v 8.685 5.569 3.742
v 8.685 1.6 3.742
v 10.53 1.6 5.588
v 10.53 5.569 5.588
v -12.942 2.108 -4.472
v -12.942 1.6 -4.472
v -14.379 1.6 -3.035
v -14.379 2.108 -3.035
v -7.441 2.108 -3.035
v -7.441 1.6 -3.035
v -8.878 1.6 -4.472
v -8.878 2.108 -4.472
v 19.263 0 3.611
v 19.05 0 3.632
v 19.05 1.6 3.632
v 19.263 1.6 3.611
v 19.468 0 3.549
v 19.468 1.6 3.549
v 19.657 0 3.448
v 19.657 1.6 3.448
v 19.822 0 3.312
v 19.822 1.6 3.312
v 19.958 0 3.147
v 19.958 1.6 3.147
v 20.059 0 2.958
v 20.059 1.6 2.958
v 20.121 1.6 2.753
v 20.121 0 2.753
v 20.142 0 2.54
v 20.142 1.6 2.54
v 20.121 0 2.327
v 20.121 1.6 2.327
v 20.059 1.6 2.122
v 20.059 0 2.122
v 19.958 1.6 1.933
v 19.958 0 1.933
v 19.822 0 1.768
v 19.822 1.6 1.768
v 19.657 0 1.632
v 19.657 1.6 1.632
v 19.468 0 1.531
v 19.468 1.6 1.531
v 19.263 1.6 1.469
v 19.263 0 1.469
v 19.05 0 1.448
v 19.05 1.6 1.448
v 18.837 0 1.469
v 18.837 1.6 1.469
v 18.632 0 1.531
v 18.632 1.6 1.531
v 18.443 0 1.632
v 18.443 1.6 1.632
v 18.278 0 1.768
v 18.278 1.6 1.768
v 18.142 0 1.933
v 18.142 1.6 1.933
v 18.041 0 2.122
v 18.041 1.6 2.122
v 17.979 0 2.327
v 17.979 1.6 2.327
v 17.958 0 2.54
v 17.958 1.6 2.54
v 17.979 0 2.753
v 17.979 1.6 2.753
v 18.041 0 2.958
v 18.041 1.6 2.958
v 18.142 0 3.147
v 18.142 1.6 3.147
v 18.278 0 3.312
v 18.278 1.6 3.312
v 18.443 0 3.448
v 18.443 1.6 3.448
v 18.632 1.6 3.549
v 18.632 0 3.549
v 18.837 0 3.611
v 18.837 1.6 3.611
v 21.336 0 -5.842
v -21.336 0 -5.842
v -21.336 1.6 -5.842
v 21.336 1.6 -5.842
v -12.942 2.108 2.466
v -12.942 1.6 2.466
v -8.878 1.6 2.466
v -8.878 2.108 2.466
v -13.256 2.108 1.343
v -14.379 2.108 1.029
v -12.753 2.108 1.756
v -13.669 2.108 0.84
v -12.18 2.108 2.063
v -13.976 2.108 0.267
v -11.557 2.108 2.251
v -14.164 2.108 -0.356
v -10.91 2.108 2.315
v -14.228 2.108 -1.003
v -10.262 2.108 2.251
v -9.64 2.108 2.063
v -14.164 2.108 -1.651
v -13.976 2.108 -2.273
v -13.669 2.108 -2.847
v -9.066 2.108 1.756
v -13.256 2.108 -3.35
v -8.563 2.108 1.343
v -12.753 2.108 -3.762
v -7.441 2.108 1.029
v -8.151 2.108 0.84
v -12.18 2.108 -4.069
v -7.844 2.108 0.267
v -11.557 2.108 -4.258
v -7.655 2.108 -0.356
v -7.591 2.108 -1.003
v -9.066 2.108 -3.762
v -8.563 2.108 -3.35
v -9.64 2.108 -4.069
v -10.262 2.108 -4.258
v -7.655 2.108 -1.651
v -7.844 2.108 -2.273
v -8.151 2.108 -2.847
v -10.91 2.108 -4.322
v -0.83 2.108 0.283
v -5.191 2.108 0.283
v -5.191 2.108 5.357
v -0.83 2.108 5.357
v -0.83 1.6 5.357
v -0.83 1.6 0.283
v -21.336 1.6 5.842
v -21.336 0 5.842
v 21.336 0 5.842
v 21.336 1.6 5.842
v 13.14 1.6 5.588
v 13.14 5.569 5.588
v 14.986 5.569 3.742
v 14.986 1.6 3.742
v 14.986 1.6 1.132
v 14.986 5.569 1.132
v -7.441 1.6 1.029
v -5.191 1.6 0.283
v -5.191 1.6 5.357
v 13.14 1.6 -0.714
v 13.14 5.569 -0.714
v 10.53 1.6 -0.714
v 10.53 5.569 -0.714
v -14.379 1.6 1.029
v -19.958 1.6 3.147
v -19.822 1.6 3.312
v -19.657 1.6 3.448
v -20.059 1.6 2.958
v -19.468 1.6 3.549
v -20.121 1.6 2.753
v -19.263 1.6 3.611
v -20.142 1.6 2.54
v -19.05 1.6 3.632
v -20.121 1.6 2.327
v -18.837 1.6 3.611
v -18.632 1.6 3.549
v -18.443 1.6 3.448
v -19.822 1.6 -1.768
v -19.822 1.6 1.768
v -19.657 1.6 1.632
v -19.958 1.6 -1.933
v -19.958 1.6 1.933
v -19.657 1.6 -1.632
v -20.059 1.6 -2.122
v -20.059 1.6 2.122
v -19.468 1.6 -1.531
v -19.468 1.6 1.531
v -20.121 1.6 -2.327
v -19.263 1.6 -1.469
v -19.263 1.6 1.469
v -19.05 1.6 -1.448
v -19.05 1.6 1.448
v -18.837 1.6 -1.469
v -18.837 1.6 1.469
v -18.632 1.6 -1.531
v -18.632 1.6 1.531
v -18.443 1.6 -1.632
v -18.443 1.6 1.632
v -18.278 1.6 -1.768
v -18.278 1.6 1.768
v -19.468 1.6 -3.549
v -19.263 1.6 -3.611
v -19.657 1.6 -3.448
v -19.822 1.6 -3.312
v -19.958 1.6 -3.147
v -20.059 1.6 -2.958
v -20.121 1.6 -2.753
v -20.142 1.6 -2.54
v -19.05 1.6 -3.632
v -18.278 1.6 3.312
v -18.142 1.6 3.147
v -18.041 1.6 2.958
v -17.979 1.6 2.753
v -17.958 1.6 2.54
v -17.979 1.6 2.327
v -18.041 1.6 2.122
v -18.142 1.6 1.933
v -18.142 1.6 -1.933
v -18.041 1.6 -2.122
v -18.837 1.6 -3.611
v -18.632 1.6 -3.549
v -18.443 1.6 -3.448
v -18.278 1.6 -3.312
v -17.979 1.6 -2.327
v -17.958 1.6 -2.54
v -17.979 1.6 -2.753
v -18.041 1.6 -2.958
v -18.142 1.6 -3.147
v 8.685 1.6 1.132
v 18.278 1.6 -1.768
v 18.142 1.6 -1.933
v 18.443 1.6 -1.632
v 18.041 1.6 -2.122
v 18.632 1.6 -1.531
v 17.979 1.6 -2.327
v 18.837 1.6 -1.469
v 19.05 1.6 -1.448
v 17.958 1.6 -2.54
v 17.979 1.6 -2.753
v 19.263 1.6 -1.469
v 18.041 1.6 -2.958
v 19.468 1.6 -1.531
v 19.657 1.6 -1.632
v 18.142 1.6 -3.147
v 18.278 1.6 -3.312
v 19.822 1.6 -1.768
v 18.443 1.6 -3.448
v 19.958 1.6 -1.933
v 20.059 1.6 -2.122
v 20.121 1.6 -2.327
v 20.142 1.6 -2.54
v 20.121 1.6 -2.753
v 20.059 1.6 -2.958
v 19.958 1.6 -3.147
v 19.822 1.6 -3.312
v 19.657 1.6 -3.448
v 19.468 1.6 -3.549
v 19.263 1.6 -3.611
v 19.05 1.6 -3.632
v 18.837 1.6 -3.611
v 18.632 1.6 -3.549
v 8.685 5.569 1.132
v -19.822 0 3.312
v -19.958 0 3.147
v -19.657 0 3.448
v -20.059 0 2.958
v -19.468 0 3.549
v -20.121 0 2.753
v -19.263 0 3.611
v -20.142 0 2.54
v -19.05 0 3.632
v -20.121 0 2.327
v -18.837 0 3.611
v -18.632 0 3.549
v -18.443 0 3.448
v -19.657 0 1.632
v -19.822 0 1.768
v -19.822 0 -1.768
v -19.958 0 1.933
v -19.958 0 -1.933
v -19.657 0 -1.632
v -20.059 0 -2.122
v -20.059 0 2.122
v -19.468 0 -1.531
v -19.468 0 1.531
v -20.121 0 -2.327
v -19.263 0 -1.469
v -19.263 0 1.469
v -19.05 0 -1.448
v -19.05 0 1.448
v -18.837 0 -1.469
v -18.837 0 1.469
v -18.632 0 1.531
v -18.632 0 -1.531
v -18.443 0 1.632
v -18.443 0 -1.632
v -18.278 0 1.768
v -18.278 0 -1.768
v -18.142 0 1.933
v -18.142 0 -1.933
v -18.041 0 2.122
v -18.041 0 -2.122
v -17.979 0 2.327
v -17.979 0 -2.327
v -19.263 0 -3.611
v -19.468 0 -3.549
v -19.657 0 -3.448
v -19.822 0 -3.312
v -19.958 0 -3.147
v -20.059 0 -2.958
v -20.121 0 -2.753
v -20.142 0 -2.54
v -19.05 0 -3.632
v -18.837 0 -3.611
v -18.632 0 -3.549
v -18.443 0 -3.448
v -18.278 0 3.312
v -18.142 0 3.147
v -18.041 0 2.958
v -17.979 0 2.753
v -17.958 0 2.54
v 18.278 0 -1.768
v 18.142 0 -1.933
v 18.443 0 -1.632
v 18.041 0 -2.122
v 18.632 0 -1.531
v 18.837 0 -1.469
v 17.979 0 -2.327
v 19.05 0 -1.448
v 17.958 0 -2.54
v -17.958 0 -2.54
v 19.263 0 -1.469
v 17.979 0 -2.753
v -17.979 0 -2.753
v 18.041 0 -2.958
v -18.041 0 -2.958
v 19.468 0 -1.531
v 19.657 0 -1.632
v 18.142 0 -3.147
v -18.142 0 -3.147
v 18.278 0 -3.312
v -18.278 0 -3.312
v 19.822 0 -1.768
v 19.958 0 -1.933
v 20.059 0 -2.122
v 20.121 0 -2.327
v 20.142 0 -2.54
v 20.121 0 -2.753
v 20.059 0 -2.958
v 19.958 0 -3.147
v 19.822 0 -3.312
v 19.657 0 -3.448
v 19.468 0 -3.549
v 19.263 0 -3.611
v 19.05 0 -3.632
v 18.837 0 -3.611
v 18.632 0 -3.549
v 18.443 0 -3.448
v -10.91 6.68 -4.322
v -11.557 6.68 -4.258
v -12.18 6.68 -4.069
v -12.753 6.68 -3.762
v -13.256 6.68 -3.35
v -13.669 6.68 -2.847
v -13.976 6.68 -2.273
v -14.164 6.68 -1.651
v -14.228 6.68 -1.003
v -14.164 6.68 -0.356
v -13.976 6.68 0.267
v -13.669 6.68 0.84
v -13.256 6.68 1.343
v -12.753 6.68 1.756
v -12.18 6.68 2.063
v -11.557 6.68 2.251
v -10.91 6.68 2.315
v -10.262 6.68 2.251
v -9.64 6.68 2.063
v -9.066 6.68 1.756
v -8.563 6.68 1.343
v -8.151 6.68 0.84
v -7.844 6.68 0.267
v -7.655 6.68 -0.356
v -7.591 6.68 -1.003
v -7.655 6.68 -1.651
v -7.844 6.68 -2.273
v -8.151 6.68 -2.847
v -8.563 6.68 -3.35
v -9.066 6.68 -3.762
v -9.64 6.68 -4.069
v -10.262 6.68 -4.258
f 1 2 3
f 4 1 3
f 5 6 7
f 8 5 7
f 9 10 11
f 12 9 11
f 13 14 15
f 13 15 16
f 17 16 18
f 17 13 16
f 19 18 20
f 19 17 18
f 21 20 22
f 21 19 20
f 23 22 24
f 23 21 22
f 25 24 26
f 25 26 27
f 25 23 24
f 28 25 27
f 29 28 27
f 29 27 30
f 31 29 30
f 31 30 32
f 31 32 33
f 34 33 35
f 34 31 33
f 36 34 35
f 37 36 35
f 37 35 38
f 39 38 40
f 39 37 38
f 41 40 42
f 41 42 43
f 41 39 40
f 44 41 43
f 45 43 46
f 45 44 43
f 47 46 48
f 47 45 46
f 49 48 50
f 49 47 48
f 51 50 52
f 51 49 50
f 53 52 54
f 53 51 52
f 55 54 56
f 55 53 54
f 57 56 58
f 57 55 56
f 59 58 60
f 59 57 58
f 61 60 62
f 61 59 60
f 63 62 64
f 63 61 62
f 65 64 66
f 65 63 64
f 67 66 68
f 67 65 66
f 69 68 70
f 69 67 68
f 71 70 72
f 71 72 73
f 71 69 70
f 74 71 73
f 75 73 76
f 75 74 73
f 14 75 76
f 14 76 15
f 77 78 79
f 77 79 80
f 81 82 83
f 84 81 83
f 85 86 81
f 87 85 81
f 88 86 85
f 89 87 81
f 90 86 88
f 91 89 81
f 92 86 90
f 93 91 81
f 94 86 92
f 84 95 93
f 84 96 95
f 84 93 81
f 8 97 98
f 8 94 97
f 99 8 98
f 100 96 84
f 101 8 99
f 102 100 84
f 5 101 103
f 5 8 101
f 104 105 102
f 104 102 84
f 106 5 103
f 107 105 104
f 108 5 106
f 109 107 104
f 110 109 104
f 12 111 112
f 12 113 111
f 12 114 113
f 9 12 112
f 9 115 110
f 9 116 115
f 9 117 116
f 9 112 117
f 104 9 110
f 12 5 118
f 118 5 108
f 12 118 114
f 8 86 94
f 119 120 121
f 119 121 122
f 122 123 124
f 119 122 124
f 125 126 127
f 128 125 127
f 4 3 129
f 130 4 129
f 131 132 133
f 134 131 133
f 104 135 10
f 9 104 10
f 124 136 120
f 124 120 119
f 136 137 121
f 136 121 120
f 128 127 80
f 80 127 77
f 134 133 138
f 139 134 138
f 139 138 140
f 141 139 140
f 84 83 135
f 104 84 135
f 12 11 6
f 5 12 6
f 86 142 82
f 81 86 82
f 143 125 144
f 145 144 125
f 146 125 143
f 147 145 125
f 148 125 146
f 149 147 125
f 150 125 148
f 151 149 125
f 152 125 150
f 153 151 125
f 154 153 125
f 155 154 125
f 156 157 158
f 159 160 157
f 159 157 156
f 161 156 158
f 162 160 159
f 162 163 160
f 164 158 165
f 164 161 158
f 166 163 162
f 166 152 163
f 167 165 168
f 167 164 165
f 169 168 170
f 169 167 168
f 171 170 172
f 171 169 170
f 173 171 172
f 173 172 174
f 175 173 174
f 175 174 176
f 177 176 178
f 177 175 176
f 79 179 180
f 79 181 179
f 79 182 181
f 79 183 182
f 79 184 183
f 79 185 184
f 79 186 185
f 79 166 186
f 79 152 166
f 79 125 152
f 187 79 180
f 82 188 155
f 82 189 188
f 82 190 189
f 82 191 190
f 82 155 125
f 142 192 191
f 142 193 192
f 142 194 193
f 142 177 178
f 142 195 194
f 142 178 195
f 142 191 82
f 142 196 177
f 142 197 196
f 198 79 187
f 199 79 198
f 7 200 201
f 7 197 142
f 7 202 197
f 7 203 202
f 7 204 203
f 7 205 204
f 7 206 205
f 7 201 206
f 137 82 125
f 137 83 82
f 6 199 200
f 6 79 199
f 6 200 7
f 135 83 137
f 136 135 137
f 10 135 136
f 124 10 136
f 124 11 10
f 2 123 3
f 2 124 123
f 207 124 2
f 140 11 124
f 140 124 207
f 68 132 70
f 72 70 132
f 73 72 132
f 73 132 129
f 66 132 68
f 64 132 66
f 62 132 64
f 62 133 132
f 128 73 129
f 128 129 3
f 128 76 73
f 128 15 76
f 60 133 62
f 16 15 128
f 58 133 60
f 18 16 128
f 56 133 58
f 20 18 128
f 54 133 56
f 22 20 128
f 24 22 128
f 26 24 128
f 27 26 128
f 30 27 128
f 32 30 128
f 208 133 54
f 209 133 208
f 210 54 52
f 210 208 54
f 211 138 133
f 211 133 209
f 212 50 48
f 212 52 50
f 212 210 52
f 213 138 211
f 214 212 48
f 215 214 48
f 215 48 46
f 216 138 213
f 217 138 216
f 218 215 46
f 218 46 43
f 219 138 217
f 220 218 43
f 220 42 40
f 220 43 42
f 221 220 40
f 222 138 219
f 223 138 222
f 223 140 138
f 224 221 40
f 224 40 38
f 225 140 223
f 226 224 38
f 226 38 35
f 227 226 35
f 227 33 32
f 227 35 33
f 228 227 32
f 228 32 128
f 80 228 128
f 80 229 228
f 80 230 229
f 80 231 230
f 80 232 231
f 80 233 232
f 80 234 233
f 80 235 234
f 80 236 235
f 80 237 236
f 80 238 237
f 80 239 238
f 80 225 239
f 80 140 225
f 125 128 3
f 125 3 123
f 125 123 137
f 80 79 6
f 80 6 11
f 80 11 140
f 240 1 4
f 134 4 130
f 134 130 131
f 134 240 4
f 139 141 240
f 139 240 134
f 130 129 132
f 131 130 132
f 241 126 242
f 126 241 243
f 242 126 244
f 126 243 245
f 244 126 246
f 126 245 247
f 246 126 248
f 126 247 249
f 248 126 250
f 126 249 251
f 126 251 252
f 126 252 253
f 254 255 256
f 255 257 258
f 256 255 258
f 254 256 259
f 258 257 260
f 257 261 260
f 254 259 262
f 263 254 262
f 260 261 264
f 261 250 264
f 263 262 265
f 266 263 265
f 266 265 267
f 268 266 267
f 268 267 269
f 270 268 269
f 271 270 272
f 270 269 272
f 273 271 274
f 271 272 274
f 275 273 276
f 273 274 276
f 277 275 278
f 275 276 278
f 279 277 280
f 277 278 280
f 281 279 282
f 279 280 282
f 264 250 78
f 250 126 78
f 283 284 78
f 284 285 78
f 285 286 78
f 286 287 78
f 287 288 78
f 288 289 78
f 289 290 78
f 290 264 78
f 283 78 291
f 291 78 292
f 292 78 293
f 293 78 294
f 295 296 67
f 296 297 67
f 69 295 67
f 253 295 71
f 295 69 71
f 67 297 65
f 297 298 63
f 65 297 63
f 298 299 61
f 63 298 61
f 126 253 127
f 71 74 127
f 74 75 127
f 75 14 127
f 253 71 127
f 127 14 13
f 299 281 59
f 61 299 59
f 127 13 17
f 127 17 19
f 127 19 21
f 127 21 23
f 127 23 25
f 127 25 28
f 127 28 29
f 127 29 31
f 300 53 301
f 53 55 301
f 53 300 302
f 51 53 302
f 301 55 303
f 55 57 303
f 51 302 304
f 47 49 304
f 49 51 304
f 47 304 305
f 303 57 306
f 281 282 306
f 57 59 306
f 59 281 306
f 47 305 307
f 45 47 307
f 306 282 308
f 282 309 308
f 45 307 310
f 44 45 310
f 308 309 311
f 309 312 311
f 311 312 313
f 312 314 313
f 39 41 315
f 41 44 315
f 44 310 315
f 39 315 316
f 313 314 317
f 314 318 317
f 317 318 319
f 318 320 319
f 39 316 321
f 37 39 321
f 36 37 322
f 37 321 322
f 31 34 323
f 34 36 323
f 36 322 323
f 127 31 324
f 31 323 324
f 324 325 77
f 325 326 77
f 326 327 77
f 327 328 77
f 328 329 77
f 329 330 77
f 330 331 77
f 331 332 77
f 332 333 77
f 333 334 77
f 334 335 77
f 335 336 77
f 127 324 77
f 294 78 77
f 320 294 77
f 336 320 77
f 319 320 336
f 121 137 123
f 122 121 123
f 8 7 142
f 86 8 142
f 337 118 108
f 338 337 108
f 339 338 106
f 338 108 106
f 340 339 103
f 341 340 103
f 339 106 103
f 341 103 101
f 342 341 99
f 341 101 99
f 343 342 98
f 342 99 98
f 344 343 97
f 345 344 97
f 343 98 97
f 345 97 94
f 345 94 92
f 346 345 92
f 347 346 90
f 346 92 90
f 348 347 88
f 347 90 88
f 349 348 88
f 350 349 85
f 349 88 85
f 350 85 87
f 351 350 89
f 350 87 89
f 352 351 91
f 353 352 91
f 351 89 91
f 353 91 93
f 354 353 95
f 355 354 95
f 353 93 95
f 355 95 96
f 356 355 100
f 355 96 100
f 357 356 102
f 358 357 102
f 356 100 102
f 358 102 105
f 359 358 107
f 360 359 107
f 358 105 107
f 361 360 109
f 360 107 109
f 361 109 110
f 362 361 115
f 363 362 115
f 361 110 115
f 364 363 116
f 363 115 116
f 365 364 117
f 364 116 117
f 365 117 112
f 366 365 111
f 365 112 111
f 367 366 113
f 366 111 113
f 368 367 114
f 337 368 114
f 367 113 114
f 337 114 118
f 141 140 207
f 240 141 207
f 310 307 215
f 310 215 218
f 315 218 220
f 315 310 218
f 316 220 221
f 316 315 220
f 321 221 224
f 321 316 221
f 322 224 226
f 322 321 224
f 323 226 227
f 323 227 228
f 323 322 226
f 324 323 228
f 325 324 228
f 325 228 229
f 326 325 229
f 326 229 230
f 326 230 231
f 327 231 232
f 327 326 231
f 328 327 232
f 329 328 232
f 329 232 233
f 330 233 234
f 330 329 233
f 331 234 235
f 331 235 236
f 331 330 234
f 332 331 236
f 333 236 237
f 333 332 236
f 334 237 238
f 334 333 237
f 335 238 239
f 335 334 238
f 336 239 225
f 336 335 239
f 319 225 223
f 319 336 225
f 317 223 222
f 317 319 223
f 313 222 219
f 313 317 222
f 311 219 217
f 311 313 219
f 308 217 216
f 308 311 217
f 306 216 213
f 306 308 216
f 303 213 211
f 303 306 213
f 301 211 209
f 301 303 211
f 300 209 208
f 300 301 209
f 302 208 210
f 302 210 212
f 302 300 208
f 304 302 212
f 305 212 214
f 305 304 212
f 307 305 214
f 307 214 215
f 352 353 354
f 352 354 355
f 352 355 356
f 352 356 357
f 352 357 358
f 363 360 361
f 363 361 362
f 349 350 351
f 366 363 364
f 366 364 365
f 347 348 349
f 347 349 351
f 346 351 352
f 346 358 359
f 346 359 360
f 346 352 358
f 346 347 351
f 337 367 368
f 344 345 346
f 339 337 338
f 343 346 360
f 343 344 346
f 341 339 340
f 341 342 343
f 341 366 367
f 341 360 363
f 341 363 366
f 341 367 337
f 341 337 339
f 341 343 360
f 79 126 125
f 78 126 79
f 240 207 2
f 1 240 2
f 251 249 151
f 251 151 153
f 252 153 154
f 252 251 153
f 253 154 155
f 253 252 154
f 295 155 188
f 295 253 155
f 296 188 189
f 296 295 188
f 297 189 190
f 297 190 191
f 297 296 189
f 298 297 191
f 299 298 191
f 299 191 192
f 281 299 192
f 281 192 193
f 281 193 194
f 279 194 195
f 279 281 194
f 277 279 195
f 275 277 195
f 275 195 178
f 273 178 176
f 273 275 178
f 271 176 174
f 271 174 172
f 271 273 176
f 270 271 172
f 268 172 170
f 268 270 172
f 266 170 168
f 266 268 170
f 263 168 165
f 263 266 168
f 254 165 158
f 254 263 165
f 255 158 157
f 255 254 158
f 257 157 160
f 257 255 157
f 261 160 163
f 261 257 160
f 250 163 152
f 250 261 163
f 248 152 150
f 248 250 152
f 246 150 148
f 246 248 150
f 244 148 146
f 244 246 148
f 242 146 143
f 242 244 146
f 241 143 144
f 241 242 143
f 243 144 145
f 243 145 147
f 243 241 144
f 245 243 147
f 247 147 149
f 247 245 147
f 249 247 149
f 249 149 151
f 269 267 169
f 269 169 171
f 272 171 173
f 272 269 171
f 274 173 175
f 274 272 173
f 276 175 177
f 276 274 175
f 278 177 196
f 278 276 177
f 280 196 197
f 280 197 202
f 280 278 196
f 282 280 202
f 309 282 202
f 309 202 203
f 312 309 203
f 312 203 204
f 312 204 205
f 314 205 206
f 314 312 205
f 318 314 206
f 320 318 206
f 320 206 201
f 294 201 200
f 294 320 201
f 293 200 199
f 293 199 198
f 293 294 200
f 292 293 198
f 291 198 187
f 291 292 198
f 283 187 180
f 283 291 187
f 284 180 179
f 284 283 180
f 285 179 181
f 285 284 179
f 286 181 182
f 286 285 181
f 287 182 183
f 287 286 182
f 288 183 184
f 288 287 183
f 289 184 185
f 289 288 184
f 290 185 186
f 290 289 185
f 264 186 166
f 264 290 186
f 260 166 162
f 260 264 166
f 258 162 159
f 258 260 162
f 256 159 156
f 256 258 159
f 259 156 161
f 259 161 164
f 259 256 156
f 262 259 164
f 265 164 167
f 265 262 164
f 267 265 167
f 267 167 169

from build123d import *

# Parameters (mm, degrees)
SKETCH1_W           = 42.672
SKETCH1_H           = 11.684
SKETCH1_R           = 1.0922
BOSS_EXTRUDE1_DEPTH = 1.6002
SKETCH2_W           = 4.360829253
SKETCH2_H           = 5.074241287
BOSS_EXTRUDE2_DEPTH = 0.508
BOSS_EXTRUDE3_DEPTH = 0.508
SKETCH4_R           = 3.318325067
BOSS_EXTRUDE4_DEPTH = 4.572
BOSS_EXTRUDE5_DEPTH = 3.96875


with BuildPart() as part:
    # Sketch1 → Boss-Extrude1 (new body)
    with BuildSketch(Plane(origin=(0, 0, 0), x_dir=(1, 0, 0), z_dir=(0, 1, 0))):
        Rectangle(SKETCH1_W, SKETCH1_H)
        with Locations(Location((-19.05, 2.54, 0), (0, 0, 270))):
            Circle(SKETCH1_R, mode=Mode.SUBTRACT)
        with Locations(Location((-19.05, -2.54, 0), (0, 0, 270))):
            Circle(SKETCH1_R, mode=Mode.SUBTRACT)
        with Locations(Location((19.05, 2.54, 0), (0, 0, 270))):
            Circle(SKETCH1_R, mode=Mode.SUBTRACT)
        with Locations(Location((19.05, -2.54, 0), (0, 0, 270))):
            Circle(SKETCH1_R, mode=Mode.SUBTRACT)
    extrude(amount=BOSS_EXTRUDE1_DEPTH)

    # Sketch2 → Boss-Extrude2 (add)
    with BuildSketch(Plane(origin=(0, 1.6002, 0), x_dir=(1, 0, 0), z_dir=(0, 1, 0))):
        with Locations((-3.010313867, -2.820245611)):
            Rectangle(SKETCH2_W, SKETCH2_H)
    extrude(amount=BOSS_EXTRUDE2_DEPTH)

    # Sketch3 → Boss-Extrude3 (add)
    with BuildSketch(Plane(origin=(0, 1.6002, 0), x_dir=(1, 0, 0), z_dir=(0, 1, 0))):
        Polygon((-7.440948477, -1.028779312), (-7.440948477, 3.035220688), (-8.877789457, 4.472061667), (-12.941789457, 4.472061667), (-14.378630436, 3.035220688), (-14.378630436, -1.028779312), (-12.941789457, -2.465620292), (-8.877789457, -2.465620292), align=None)
    extrude(amount=BOSS_EXTRUDE3_DEPTH)

    # Sketch4 → Boss-Extrude4 (add)
    with BuildSketch(Plane(origin=(0, 2.1082, 0), x_dir=(1, 0, 0), z_dir=(0, 1, 0))):
        with Locations(Location((-10.909789457, 1.003220688, 0), (0, 0, 90))):
            Circle(SKETCH4_R)
    extrude(amount=BOSS_EXTRUDE4_DEPTH)

    # Sketch5 → Boss-Extrude5 (add)
    with BuildSketch(Plane(origin=(0, 1.6002, 0), x_dir=(1, 0, 0), z_dir=(0, 1, 0))):
        Polygon((14.986, -3.741894505), (14.986, -1.131751289), (13.140350032, 0.71389868), (10.530206815, 0.71389868), (8.684556847, -1.131751289), (8.684556847, -3.741894505), (10.530206815, -5.587544473), (13.140350032, -5.587544473), align=None)
    extrude(amount=BOSS_EXTRUDE5_DEPTH)


solid = part.part
